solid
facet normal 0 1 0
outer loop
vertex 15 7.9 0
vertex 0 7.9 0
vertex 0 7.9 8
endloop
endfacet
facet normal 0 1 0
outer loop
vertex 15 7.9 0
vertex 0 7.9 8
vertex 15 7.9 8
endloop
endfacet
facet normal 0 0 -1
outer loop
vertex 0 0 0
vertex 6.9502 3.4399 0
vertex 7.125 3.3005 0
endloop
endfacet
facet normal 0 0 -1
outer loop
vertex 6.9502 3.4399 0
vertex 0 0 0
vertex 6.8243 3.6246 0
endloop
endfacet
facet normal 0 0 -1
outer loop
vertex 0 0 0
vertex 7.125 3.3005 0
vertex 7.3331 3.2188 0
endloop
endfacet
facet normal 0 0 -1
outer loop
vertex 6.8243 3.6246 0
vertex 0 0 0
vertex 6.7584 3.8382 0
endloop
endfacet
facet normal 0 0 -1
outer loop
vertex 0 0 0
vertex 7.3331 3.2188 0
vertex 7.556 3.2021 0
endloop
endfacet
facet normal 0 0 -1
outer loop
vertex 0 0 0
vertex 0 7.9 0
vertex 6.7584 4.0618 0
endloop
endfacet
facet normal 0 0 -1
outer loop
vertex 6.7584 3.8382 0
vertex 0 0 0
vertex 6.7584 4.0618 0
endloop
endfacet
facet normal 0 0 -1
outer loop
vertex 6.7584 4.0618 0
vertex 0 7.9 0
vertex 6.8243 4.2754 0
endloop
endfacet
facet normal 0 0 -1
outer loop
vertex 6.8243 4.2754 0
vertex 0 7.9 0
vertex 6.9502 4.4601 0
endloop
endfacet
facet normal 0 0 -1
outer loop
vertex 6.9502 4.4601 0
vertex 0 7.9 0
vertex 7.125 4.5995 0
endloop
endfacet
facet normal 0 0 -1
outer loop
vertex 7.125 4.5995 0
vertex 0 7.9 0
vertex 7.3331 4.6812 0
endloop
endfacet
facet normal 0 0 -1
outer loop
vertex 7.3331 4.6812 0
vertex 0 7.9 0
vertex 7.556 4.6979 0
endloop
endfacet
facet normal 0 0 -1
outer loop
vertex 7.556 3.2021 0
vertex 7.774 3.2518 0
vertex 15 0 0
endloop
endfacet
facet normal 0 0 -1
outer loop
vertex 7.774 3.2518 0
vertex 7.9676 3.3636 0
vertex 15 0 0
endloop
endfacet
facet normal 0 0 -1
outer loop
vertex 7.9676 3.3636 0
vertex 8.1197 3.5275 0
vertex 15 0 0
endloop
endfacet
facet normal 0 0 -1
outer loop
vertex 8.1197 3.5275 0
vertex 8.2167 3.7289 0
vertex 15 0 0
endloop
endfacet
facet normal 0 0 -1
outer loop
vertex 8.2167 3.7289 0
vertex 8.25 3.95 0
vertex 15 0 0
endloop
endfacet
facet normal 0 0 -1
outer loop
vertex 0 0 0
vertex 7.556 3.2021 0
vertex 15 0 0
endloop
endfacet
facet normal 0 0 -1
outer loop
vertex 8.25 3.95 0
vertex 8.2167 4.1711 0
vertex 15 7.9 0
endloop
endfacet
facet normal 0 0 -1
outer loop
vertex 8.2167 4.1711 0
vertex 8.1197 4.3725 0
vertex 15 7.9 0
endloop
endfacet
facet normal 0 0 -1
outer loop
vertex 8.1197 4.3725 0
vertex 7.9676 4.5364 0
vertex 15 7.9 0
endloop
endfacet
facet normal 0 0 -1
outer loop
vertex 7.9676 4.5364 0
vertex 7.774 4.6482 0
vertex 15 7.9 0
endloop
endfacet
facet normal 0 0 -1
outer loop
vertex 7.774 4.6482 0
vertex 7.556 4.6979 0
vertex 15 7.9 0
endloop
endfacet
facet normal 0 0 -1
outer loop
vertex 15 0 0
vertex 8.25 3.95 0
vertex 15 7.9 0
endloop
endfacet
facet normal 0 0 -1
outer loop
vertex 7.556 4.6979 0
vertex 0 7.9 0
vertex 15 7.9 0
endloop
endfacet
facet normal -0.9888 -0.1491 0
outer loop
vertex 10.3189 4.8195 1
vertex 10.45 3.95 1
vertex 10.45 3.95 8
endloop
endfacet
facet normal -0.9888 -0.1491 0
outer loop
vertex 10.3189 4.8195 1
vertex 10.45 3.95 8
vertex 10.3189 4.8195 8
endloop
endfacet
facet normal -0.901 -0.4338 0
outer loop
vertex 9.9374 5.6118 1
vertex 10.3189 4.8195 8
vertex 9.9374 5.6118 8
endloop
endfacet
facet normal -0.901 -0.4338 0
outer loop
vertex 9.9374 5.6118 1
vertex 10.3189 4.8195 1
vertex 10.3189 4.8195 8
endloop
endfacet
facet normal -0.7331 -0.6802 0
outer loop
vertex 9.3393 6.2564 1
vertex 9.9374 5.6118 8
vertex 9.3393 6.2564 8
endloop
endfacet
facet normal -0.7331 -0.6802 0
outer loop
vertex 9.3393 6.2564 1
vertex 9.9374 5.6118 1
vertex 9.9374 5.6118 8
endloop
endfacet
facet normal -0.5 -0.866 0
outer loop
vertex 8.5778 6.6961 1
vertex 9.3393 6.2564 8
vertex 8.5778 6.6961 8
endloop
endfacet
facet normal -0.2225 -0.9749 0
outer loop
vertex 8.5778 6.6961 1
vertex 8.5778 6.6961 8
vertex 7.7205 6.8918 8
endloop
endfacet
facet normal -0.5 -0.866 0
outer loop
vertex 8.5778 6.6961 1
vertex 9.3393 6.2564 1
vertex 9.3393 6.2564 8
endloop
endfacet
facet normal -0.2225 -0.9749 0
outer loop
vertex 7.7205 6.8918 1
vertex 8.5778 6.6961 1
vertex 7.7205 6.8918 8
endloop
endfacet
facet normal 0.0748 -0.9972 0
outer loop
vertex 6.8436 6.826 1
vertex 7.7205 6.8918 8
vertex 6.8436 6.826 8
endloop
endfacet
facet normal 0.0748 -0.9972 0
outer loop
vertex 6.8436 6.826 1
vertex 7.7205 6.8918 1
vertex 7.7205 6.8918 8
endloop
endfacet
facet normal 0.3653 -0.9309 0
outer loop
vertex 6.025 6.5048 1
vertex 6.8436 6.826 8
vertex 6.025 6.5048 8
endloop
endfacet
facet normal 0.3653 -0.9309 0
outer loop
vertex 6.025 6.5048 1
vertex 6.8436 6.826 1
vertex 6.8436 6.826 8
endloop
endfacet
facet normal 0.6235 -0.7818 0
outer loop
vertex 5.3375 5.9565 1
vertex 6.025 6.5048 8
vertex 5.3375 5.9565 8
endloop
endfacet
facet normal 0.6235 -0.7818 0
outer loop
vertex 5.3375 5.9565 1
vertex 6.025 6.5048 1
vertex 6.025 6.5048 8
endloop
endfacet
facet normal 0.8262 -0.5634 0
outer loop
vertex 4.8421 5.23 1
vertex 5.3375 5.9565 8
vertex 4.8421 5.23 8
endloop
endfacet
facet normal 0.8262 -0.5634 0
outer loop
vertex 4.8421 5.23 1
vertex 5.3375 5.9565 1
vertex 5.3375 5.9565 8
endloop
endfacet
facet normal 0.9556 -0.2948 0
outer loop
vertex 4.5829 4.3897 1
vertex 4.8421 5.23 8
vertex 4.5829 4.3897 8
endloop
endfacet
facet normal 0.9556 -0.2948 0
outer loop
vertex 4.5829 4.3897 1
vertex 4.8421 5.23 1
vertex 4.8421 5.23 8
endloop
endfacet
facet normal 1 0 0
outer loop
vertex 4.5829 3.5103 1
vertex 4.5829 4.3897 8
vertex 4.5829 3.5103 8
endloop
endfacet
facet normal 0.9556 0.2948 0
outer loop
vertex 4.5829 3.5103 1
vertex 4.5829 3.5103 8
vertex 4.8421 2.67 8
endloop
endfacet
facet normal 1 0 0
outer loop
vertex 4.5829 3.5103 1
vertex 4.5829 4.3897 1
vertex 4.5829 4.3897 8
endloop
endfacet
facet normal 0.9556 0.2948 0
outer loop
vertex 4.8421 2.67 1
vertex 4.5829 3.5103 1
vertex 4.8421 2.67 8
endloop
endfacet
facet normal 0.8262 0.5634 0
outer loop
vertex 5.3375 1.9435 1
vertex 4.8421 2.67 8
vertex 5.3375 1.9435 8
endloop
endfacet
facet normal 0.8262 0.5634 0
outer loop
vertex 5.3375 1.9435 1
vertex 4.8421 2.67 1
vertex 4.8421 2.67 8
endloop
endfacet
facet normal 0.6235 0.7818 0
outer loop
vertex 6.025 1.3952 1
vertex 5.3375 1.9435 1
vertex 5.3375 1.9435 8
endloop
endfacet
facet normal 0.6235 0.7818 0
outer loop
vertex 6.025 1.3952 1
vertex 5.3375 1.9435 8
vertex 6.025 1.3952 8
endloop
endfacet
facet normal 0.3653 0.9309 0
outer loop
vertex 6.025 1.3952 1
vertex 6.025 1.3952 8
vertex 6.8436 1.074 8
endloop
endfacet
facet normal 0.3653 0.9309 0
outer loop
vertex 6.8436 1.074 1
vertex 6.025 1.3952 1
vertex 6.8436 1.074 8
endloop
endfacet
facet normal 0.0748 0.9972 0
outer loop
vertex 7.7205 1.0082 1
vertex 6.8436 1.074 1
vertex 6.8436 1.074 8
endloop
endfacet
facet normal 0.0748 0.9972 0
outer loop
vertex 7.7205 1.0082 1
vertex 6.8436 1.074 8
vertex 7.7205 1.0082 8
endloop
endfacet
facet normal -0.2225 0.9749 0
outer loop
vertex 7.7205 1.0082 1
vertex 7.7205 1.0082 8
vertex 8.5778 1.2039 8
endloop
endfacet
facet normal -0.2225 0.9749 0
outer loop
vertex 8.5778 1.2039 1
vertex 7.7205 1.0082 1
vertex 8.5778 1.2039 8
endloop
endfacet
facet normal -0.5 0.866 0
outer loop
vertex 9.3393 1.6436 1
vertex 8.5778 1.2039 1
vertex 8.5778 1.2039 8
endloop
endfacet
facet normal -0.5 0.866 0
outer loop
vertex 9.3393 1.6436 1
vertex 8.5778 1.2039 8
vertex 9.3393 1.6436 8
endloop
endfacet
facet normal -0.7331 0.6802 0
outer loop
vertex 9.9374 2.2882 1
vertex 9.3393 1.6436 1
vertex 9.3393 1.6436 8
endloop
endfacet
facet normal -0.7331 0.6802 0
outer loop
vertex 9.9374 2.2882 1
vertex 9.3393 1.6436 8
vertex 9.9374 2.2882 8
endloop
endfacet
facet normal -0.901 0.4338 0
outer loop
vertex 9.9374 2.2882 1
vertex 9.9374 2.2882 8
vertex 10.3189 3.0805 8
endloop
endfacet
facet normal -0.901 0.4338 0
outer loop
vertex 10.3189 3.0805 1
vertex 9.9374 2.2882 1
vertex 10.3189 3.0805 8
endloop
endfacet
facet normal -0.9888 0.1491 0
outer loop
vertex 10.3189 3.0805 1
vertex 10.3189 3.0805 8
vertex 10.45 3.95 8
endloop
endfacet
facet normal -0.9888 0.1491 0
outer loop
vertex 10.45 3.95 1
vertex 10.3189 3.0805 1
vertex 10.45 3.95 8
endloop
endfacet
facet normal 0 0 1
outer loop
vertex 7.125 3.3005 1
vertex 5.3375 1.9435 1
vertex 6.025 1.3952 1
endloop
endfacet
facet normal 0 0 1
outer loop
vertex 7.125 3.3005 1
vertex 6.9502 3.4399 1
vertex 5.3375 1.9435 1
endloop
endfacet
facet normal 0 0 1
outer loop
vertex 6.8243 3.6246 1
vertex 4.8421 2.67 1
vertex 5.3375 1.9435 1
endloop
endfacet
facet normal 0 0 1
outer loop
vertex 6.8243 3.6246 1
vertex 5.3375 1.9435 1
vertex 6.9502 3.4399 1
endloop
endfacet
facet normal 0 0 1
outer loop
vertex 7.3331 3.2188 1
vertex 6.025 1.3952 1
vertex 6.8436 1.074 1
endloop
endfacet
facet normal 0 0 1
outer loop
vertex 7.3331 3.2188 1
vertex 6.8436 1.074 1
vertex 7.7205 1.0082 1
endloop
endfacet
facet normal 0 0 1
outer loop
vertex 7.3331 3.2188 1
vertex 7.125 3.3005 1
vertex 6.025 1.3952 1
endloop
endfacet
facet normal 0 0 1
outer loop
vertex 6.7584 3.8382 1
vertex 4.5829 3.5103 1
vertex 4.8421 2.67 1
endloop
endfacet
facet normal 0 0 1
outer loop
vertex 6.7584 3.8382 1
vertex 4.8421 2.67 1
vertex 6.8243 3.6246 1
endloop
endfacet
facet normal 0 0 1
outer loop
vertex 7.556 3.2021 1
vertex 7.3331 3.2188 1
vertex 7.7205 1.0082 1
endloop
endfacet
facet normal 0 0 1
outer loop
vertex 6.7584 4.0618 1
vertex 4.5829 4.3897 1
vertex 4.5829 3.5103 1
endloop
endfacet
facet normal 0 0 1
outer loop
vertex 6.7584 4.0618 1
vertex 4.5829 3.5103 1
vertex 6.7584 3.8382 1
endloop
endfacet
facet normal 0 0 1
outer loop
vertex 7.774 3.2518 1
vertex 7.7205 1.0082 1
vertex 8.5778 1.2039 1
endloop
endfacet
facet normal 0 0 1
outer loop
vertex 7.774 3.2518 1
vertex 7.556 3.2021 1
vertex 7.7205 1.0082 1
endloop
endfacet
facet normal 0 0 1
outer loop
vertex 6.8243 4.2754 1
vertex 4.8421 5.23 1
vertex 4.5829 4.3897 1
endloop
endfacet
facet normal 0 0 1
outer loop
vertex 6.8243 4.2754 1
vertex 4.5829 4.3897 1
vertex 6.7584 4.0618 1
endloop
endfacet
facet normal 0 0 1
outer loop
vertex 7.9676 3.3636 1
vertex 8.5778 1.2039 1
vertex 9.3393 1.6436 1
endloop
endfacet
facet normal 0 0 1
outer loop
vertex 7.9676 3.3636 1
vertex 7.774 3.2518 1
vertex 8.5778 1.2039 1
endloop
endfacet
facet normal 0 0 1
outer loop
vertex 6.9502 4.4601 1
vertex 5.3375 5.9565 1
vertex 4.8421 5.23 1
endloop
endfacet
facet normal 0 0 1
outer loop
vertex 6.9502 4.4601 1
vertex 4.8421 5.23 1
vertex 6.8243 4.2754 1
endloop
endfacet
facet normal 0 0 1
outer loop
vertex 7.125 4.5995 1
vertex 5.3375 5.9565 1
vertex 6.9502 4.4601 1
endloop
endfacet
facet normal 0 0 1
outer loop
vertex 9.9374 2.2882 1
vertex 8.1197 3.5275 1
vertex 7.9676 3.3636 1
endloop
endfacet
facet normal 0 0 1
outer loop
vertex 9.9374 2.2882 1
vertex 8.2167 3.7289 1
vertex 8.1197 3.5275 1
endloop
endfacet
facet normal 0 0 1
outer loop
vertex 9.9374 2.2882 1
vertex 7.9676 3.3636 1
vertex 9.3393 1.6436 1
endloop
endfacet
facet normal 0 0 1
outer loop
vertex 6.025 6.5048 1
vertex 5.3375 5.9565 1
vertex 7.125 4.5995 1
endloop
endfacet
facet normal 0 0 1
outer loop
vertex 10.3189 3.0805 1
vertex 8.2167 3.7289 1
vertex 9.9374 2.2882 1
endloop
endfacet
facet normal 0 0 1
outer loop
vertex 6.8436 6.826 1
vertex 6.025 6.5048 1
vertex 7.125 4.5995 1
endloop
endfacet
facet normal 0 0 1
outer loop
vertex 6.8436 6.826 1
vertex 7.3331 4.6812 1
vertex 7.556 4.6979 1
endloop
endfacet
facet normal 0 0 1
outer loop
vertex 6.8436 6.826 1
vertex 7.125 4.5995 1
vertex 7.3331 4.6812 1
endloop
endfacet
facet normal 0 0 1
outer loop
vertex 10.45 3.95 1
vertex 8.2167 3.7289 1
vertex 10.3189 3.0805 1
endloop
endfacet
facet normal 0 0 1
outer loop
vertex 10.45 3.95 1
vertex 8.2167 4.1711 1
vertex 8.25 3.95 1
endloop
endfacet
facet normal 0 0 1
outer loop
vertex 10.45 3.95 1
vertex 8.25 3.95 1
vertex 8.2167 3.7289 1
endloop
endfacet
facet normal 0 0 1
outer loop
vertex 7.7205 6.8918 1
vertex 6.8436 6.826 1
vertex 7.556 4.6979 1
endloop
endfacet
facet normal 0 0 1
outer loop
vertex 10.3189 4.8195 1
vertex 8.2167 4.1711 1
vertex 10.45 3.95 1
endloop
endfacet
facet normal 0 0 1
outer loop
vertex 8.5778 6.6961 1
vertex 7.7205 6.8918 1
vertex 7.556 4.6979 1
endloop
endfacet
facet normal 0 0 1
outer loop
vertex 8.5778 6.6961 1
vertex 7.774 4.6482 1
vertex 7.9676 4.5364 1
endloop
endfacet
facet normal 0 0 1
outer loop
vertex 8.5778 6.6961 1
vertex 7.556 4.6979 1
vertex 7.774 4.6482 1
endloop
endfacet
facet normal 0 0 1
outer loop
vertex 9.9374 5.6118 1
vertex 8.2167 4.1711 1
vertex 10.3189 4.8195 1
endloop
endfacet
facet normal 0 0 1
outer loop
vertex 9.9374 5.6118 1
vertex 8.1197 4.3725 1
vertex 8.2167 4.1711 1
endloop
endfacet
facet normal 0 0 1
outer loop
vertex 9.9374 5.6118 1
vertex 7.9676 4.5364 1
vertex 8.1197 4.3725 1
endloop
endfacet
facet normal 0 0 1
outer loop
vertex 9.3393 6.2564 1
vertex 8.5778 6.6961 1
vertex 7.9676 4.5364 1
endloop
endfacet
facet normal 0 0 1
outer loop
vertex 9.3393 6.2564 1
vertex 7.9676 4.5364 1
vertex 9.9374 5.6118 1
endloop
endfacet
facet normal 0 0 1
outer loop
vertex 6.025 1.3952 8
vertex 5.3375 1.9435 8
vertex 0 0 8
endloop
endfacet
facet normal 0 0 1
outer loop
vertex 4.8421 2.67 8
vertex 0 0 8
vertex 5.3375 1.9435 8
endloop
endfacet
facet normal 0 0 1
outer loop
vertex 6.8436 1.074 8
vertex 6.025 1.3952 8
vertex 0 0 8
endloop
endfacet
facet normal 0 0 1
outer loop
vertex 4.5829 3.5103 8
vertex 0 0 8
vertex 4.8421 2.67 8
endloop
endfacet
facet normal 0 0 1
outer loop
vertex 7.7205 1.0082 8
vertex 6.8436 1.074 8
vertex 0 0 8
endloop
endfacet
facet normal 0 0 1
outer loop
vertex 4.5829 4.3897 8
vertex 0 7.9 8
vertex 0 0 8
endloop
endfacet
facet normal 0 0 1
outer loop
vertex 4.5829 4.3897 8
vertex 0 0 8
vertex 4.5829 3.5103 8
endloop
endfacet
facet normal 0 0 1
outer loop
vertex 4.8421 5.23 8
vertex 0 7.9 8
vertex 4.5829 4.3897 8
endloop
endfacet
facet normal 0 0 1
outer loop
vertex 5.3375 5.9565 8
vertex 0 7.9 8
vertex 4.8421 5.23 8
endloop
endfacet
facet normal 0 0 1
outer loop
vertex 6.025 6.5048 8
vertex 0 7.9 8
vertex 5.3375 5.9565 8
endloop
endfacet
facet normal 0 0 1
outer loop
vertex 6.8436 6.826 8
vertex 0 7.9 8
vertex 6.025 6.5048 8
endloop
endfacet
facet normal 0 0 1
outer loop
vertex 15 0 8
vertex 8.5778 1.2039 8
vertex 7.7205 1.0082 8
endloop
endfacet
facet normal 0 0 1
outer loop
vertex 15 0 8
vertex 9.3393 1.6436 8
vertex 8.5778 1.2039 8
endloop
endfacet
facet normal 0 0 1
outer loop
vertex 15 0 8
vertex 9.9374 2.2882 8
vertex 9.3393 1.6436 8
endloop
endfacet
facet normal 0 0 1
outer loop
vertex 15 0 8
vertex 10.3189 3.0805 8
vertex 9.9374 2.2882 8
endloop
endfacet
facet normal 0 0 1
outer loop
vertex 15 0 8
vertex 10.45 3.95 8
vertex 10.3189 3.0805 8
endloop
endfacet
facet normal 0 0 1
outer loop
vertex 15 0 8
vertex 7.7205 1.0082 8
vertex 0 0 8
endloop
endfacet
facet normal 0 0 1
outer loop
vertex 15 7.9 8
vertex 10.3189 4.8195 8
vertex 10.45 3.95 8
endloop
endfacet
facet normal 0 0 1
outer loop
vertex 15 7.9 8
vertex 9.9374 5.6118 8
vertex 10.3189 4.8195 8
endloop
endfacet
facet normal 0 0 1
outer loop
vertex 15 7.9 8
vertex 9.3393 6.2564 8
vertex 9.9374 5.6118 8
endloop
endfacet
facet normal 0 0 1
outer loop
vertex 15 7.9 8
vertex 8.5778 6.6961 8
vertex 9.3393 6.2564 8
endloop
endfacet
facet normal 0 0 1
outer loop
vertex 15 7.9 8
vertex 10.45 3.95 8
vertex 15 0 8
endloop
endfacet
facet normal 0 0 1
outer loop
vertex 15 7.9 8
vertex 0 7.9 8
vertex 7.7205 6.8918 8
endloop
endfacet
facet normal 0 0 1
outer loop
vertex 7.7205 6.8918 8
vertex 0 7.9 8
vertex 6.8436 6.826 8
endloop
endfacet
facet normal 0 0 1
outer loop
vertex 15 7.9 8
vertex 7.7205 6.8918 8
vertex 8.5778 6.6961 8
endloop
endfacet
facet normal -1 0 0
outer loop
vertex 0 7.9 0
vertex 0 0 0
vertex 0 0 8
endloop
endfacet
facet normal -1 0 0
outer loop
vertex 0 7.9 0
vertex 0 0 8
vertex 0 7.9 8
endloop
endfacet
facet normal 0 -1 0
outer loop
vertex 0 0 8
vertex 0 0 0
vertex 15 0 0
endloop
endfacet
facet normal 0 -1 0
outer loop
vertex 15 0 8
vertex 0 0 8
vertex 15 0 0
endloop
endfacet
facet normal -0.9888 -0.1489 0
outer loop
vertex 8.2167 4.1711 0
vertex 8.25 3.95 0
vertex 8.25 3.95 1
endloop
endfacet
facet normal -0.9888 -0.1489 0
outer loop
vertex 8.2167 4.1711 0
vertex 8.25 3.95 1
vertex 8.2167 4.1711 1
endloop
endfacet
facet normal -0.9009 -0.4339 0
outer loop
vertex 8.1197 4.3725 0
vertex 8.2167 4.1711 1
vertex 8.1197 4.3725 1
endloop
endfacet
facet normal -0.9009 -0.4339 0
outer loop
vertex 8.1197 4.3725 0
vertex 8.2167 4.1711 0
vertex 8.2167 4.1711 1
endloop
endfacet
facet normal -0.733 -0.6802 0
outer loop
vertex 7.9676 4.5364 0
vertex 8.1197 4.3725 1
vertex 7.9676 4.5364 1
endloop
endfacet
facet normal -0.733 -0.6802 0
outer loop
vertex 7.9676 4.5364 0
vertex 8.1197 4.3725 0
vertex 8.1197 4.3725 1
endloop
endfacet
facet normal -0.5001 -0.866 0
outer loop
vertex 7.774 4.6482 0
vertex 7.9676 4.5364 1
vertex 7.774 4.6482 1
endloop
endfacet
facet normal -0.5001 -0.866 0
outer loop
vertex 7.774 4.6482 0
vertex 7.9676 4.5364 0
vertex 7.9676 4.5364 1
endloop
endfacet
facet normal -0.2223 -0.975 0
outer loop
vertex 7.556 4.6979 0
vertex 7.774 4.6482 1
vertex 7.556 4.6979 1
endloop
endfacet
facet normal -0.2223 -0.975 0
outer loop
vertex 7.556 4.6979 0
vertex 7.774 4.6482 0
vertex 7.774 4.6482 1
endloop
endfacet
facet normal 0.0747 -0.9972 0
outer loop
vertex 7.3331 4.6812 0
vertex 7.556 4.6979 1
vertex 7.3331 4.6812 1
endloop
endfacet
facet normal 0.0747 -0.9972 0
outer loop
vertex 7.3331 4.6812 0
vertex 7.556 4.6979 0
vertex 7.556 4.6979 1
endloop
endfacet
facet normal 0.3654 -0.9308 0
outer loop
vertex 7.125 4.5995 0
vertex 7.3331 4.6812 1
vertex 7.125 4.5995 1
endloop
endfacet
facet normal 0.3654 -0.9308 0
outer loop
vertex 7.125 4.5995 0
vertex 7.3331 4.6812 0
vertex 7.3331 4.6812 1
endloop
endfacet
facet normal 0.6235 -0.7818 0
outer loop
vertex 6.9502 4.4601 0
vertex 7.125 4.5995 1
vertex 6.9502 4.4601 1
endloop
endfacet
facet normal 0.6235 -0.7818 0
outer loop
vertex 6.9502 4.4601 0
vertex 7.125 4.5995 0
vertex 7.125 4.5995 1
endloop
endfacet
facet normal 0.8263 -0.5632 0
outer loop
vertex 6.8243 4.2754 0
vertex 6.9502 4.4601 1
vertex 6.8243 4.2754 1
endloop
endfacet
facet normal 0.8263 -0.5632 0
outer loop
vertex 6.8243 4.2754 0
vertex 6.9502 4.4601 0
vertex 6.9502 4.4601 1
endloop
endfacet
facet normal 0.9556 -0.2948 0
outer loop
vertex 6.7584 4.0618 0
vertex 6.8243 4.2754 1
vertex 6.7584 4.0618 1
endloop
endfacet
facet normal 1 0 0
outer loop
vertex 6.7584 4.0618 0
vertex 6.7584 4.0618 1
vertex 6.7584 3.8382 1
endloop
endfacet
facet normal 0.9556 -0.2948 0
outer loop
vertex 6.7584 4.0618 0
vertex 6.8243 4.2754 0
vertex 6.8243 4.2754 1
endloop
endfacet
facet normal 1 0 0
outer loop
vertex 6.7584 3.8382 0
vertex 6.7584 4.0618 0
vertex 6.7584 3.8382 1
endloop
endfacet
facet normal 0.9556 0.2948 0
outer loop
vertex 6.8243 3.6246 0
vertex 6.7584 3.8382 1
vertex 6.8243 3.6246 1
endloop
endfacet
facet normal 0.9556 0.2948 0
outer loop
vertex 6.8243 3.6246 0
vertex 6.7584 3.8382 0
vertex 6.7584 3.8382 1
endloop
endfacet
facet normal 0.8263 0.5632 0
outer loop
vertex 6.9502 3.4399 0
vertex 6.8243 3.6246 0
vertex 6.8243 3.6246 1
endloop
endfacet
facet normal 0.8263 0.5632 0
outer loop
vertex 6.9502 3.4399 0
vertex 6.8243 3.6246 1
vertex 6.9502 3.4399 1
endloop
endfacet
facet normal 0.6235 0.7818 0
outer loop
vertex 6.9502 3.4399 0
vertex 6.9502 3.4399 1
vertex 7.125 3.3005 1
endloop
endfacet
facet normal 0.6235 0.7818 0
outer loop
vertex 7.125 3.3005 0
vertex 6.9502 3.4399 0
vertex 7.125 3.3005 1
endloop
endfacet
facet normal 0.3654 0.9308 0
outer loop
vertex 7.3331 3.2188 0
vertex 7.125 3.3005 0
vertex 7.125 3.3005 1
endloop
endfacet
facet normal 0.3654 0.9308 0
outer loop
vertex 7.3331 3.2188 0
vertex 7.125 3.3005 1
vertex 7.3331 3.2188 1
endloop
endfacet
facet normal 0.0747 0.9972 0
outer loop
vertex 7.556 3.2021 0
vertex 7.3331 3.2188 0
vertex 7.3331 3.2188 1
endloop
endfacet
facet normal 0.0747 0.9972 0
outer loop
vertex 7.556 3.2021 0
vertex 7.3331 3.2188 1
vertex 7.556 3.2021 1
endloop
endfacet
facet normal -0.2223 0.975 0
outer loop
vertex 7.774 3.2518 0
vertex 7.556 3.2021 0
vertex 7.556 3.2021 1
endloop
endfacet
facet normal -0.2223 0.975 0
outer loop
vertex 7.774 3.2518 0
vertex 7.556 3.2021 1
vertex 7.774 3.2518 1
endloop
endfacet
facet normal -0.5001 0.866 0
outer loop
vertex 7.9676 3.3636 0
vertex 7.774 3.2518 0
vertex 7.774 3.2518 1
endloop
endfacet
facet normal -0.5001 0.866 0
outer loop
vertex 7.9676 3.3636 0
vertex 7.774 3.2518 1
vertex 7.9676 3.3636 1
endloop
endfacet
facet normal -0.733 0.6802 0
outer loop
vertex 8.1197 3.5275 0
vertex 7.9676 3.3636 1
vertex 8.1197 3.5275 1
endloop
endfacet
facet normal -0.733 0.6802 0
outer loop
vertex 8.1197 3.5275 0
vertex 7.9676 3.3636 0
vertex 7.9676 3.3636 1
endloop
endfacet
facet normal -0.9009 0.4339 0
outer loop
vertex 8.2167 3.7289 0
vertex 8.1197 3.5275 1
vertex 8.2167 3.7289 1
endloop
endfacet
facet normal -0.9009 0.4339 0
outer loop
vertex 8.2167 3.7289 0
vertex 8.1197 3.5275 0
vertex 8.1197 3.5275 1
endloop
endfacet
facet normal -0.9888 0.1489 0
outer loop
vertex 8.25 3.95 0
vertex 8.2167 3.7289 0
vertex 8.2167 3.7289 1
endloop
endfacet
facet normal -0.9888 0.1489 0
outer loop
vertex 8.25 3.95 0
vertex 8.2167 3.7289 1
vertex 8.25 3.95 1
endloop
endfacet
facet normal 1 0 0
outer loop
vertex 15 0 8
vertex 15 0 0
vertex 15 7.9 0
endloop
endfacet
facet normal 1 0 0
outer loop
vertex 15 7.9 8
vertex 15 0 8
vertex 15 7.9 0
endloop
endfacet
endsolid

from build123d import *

# Parameters (mm, degrees)
F0_W     = 15
F0_H     = 7.9
F0_R     = 2.95
F1_DEPTH = 8
F0_R_2   = 0.75
F2_DEPTH = 1


with BuildPart() as f1:
    # F0 (on Top) → F1 (new body)
    with BuildSketch(Plane.XY):
        with Locations((7.5, 3.95)):
            Rectangle(F0_W, F0_H)
        with Locations((7.5, 3.95)):
            Circle(F0_R, mode=Mode.SUBTRACT)
    extrude(amount=F1_DEPTH)

    # F0 (on Top) → F2 (join)
    with BuildSketch(Plane.XY):
        with Locations((7.5, 3.95)):
            Circle(F0_R)
        with Locations((7.5, 3.95)):
            Circle(F0_R_2, mode=Mode.SUBTRACT)
    extrude(amount=F2_DEPTH)


solid = f1.part
